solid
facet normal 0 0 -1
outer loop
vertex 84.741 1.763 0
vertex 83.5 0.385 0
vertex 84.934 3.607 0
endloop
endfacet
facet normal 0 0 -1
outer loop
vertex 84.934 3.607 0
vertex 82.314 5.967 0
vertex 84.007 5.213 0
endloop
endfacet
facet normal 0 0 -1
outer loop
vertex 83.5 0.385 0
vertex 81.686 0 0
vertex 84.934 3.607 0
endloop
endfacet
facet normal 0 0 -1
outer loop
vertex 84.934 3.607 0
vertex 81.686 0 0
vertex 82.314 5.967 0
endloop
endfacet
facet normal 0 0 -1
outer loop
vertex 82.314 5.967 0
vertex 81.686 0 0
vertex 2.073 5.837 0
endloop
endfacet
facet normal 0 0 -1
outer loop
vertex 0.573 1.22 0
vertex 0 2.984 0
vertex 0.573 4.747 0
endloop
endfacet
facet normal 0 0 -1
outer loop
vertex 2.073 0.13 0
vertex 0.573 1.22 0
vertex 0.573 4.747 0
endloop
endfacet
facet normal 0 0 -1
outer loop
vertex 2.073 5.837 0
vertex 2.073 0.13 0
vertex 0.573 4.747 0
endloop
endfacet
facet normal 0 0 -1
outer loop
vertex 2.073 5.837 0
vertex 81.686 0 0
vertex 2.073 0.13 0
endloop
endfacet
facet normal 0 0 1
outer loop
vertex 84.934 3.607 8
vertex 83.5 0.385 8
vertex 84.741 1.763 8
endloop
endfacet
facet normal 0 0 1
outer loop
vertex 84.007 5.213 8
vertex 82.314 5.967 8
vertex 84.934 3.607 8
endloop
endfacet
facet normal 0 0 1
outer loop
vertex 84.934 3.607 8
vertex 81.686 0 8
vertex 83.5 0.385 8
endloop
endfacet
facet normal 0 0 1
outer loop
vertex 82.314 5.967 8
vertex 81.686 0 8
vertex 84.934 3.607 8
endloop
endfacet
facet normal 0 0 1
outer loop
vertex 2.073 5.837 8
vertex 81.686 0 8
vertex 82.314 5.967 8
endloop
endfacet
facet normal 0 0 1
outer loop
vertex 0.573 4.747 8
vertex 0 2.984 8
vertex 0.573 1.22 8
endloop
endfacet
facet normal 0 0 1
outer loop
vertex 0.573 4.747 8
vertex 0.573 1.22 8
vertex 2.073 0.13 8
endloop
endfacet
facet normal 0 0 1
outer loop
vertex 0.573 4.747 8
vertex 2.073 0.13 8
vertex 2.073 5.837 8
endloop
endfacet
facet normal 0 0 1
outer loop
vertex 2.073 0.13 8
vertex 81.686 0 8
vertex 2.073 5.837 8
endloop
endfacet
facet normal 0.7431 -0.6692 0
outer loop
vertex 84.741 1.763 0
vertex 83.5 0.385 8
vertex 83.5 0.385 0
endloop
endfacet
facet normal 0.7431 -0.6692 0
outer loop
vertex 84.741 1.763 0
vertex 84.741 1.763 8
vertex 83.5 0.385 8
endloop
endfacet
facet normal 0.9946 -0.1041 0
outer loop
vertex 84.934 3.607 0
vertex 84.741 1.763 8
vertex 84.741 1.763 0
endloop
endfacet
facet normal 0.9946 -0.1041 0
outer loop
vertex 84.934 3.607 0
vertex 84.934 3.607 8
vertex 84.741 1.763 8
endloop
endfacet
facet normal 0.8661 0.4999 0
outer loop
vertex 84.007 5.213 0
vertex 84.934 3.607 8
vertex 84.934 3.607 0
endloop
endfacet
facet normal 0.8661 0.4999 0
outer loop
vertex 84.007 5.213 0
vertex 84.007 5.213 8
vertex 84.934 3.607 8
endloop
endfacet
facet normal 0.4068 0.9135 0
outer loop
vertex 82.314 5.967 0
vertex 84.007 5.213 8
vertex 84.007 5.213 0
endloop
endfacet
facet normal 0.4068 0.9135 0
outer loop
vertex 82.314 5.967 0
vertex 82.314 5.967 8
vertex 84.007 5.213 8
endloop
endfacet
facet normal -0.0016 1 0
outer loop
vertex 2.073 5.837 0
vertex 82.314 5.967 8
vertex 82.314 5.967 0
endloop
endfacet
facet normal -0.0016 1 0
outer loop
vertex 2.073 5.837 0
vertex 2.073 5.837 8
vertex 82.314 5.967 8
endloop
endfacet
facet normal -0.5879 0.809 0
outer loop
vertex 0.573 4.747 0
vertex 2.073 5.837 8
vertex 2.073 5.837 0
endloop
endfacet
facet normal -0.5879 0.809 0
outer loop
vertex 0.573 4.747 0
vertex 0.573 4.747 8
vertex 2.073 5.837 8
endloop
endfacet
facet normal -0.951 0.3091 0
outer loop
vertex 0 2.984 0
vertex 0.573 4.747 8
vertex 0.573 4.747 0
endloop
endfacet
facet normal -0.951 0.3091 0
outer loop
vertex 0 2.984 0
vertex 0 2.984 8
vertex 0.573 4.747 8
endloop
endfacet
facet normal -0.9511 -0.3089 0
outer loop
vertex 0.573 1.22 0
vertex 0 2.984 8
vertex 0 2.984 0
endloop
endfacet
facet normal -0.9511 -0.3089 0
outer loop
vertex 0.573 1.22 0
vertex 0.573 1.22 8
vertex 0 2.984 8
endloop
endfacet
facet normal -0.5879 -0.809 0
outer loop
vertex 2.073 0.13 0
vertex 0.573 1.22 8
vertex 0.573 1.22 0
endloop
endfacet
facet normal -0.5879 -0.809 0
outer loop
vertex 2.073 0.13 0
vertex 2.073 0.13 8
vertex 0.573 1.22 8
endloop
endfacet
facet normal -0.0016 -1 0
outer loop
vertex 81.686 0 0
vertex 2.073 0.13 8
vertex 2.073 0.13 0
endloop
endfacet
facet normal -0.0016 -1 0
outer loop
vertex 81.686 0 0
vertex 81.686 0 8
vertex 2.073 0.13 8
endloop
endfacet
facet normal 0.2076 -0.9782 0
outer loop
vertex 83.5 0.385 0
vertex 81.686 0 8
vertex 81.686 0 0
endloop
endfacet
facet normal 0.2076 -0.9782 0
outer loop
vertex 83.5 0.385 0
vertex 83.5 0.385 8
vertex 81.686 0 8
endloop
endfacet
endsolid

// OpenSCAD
$fn = 32;

// ----------------------------------------------------------------------
// Key bar: parallel key, 8 mm thick
// ----------------------------------------------------------------------

// --- parameters (mm) ---
profile_height = 8;       // extrusion height
profile_points = 11;      // points of the closed outline

profile = [[0, 2.984], [0.573, 1.22], [2.073, 0.13], [81.686, 0], [83.5, 0.385], [84.741, 1.763], [84.934, 3.607], [84.007, 5.213], [82.314, 5.967], [2.073, 5.837], [0.573, 4.747]];  // single closed polygon, 11 points, counter clockwise

// --- the one profile operation ---
linear_extrude(height = profile_height) polygon(points = profile);
